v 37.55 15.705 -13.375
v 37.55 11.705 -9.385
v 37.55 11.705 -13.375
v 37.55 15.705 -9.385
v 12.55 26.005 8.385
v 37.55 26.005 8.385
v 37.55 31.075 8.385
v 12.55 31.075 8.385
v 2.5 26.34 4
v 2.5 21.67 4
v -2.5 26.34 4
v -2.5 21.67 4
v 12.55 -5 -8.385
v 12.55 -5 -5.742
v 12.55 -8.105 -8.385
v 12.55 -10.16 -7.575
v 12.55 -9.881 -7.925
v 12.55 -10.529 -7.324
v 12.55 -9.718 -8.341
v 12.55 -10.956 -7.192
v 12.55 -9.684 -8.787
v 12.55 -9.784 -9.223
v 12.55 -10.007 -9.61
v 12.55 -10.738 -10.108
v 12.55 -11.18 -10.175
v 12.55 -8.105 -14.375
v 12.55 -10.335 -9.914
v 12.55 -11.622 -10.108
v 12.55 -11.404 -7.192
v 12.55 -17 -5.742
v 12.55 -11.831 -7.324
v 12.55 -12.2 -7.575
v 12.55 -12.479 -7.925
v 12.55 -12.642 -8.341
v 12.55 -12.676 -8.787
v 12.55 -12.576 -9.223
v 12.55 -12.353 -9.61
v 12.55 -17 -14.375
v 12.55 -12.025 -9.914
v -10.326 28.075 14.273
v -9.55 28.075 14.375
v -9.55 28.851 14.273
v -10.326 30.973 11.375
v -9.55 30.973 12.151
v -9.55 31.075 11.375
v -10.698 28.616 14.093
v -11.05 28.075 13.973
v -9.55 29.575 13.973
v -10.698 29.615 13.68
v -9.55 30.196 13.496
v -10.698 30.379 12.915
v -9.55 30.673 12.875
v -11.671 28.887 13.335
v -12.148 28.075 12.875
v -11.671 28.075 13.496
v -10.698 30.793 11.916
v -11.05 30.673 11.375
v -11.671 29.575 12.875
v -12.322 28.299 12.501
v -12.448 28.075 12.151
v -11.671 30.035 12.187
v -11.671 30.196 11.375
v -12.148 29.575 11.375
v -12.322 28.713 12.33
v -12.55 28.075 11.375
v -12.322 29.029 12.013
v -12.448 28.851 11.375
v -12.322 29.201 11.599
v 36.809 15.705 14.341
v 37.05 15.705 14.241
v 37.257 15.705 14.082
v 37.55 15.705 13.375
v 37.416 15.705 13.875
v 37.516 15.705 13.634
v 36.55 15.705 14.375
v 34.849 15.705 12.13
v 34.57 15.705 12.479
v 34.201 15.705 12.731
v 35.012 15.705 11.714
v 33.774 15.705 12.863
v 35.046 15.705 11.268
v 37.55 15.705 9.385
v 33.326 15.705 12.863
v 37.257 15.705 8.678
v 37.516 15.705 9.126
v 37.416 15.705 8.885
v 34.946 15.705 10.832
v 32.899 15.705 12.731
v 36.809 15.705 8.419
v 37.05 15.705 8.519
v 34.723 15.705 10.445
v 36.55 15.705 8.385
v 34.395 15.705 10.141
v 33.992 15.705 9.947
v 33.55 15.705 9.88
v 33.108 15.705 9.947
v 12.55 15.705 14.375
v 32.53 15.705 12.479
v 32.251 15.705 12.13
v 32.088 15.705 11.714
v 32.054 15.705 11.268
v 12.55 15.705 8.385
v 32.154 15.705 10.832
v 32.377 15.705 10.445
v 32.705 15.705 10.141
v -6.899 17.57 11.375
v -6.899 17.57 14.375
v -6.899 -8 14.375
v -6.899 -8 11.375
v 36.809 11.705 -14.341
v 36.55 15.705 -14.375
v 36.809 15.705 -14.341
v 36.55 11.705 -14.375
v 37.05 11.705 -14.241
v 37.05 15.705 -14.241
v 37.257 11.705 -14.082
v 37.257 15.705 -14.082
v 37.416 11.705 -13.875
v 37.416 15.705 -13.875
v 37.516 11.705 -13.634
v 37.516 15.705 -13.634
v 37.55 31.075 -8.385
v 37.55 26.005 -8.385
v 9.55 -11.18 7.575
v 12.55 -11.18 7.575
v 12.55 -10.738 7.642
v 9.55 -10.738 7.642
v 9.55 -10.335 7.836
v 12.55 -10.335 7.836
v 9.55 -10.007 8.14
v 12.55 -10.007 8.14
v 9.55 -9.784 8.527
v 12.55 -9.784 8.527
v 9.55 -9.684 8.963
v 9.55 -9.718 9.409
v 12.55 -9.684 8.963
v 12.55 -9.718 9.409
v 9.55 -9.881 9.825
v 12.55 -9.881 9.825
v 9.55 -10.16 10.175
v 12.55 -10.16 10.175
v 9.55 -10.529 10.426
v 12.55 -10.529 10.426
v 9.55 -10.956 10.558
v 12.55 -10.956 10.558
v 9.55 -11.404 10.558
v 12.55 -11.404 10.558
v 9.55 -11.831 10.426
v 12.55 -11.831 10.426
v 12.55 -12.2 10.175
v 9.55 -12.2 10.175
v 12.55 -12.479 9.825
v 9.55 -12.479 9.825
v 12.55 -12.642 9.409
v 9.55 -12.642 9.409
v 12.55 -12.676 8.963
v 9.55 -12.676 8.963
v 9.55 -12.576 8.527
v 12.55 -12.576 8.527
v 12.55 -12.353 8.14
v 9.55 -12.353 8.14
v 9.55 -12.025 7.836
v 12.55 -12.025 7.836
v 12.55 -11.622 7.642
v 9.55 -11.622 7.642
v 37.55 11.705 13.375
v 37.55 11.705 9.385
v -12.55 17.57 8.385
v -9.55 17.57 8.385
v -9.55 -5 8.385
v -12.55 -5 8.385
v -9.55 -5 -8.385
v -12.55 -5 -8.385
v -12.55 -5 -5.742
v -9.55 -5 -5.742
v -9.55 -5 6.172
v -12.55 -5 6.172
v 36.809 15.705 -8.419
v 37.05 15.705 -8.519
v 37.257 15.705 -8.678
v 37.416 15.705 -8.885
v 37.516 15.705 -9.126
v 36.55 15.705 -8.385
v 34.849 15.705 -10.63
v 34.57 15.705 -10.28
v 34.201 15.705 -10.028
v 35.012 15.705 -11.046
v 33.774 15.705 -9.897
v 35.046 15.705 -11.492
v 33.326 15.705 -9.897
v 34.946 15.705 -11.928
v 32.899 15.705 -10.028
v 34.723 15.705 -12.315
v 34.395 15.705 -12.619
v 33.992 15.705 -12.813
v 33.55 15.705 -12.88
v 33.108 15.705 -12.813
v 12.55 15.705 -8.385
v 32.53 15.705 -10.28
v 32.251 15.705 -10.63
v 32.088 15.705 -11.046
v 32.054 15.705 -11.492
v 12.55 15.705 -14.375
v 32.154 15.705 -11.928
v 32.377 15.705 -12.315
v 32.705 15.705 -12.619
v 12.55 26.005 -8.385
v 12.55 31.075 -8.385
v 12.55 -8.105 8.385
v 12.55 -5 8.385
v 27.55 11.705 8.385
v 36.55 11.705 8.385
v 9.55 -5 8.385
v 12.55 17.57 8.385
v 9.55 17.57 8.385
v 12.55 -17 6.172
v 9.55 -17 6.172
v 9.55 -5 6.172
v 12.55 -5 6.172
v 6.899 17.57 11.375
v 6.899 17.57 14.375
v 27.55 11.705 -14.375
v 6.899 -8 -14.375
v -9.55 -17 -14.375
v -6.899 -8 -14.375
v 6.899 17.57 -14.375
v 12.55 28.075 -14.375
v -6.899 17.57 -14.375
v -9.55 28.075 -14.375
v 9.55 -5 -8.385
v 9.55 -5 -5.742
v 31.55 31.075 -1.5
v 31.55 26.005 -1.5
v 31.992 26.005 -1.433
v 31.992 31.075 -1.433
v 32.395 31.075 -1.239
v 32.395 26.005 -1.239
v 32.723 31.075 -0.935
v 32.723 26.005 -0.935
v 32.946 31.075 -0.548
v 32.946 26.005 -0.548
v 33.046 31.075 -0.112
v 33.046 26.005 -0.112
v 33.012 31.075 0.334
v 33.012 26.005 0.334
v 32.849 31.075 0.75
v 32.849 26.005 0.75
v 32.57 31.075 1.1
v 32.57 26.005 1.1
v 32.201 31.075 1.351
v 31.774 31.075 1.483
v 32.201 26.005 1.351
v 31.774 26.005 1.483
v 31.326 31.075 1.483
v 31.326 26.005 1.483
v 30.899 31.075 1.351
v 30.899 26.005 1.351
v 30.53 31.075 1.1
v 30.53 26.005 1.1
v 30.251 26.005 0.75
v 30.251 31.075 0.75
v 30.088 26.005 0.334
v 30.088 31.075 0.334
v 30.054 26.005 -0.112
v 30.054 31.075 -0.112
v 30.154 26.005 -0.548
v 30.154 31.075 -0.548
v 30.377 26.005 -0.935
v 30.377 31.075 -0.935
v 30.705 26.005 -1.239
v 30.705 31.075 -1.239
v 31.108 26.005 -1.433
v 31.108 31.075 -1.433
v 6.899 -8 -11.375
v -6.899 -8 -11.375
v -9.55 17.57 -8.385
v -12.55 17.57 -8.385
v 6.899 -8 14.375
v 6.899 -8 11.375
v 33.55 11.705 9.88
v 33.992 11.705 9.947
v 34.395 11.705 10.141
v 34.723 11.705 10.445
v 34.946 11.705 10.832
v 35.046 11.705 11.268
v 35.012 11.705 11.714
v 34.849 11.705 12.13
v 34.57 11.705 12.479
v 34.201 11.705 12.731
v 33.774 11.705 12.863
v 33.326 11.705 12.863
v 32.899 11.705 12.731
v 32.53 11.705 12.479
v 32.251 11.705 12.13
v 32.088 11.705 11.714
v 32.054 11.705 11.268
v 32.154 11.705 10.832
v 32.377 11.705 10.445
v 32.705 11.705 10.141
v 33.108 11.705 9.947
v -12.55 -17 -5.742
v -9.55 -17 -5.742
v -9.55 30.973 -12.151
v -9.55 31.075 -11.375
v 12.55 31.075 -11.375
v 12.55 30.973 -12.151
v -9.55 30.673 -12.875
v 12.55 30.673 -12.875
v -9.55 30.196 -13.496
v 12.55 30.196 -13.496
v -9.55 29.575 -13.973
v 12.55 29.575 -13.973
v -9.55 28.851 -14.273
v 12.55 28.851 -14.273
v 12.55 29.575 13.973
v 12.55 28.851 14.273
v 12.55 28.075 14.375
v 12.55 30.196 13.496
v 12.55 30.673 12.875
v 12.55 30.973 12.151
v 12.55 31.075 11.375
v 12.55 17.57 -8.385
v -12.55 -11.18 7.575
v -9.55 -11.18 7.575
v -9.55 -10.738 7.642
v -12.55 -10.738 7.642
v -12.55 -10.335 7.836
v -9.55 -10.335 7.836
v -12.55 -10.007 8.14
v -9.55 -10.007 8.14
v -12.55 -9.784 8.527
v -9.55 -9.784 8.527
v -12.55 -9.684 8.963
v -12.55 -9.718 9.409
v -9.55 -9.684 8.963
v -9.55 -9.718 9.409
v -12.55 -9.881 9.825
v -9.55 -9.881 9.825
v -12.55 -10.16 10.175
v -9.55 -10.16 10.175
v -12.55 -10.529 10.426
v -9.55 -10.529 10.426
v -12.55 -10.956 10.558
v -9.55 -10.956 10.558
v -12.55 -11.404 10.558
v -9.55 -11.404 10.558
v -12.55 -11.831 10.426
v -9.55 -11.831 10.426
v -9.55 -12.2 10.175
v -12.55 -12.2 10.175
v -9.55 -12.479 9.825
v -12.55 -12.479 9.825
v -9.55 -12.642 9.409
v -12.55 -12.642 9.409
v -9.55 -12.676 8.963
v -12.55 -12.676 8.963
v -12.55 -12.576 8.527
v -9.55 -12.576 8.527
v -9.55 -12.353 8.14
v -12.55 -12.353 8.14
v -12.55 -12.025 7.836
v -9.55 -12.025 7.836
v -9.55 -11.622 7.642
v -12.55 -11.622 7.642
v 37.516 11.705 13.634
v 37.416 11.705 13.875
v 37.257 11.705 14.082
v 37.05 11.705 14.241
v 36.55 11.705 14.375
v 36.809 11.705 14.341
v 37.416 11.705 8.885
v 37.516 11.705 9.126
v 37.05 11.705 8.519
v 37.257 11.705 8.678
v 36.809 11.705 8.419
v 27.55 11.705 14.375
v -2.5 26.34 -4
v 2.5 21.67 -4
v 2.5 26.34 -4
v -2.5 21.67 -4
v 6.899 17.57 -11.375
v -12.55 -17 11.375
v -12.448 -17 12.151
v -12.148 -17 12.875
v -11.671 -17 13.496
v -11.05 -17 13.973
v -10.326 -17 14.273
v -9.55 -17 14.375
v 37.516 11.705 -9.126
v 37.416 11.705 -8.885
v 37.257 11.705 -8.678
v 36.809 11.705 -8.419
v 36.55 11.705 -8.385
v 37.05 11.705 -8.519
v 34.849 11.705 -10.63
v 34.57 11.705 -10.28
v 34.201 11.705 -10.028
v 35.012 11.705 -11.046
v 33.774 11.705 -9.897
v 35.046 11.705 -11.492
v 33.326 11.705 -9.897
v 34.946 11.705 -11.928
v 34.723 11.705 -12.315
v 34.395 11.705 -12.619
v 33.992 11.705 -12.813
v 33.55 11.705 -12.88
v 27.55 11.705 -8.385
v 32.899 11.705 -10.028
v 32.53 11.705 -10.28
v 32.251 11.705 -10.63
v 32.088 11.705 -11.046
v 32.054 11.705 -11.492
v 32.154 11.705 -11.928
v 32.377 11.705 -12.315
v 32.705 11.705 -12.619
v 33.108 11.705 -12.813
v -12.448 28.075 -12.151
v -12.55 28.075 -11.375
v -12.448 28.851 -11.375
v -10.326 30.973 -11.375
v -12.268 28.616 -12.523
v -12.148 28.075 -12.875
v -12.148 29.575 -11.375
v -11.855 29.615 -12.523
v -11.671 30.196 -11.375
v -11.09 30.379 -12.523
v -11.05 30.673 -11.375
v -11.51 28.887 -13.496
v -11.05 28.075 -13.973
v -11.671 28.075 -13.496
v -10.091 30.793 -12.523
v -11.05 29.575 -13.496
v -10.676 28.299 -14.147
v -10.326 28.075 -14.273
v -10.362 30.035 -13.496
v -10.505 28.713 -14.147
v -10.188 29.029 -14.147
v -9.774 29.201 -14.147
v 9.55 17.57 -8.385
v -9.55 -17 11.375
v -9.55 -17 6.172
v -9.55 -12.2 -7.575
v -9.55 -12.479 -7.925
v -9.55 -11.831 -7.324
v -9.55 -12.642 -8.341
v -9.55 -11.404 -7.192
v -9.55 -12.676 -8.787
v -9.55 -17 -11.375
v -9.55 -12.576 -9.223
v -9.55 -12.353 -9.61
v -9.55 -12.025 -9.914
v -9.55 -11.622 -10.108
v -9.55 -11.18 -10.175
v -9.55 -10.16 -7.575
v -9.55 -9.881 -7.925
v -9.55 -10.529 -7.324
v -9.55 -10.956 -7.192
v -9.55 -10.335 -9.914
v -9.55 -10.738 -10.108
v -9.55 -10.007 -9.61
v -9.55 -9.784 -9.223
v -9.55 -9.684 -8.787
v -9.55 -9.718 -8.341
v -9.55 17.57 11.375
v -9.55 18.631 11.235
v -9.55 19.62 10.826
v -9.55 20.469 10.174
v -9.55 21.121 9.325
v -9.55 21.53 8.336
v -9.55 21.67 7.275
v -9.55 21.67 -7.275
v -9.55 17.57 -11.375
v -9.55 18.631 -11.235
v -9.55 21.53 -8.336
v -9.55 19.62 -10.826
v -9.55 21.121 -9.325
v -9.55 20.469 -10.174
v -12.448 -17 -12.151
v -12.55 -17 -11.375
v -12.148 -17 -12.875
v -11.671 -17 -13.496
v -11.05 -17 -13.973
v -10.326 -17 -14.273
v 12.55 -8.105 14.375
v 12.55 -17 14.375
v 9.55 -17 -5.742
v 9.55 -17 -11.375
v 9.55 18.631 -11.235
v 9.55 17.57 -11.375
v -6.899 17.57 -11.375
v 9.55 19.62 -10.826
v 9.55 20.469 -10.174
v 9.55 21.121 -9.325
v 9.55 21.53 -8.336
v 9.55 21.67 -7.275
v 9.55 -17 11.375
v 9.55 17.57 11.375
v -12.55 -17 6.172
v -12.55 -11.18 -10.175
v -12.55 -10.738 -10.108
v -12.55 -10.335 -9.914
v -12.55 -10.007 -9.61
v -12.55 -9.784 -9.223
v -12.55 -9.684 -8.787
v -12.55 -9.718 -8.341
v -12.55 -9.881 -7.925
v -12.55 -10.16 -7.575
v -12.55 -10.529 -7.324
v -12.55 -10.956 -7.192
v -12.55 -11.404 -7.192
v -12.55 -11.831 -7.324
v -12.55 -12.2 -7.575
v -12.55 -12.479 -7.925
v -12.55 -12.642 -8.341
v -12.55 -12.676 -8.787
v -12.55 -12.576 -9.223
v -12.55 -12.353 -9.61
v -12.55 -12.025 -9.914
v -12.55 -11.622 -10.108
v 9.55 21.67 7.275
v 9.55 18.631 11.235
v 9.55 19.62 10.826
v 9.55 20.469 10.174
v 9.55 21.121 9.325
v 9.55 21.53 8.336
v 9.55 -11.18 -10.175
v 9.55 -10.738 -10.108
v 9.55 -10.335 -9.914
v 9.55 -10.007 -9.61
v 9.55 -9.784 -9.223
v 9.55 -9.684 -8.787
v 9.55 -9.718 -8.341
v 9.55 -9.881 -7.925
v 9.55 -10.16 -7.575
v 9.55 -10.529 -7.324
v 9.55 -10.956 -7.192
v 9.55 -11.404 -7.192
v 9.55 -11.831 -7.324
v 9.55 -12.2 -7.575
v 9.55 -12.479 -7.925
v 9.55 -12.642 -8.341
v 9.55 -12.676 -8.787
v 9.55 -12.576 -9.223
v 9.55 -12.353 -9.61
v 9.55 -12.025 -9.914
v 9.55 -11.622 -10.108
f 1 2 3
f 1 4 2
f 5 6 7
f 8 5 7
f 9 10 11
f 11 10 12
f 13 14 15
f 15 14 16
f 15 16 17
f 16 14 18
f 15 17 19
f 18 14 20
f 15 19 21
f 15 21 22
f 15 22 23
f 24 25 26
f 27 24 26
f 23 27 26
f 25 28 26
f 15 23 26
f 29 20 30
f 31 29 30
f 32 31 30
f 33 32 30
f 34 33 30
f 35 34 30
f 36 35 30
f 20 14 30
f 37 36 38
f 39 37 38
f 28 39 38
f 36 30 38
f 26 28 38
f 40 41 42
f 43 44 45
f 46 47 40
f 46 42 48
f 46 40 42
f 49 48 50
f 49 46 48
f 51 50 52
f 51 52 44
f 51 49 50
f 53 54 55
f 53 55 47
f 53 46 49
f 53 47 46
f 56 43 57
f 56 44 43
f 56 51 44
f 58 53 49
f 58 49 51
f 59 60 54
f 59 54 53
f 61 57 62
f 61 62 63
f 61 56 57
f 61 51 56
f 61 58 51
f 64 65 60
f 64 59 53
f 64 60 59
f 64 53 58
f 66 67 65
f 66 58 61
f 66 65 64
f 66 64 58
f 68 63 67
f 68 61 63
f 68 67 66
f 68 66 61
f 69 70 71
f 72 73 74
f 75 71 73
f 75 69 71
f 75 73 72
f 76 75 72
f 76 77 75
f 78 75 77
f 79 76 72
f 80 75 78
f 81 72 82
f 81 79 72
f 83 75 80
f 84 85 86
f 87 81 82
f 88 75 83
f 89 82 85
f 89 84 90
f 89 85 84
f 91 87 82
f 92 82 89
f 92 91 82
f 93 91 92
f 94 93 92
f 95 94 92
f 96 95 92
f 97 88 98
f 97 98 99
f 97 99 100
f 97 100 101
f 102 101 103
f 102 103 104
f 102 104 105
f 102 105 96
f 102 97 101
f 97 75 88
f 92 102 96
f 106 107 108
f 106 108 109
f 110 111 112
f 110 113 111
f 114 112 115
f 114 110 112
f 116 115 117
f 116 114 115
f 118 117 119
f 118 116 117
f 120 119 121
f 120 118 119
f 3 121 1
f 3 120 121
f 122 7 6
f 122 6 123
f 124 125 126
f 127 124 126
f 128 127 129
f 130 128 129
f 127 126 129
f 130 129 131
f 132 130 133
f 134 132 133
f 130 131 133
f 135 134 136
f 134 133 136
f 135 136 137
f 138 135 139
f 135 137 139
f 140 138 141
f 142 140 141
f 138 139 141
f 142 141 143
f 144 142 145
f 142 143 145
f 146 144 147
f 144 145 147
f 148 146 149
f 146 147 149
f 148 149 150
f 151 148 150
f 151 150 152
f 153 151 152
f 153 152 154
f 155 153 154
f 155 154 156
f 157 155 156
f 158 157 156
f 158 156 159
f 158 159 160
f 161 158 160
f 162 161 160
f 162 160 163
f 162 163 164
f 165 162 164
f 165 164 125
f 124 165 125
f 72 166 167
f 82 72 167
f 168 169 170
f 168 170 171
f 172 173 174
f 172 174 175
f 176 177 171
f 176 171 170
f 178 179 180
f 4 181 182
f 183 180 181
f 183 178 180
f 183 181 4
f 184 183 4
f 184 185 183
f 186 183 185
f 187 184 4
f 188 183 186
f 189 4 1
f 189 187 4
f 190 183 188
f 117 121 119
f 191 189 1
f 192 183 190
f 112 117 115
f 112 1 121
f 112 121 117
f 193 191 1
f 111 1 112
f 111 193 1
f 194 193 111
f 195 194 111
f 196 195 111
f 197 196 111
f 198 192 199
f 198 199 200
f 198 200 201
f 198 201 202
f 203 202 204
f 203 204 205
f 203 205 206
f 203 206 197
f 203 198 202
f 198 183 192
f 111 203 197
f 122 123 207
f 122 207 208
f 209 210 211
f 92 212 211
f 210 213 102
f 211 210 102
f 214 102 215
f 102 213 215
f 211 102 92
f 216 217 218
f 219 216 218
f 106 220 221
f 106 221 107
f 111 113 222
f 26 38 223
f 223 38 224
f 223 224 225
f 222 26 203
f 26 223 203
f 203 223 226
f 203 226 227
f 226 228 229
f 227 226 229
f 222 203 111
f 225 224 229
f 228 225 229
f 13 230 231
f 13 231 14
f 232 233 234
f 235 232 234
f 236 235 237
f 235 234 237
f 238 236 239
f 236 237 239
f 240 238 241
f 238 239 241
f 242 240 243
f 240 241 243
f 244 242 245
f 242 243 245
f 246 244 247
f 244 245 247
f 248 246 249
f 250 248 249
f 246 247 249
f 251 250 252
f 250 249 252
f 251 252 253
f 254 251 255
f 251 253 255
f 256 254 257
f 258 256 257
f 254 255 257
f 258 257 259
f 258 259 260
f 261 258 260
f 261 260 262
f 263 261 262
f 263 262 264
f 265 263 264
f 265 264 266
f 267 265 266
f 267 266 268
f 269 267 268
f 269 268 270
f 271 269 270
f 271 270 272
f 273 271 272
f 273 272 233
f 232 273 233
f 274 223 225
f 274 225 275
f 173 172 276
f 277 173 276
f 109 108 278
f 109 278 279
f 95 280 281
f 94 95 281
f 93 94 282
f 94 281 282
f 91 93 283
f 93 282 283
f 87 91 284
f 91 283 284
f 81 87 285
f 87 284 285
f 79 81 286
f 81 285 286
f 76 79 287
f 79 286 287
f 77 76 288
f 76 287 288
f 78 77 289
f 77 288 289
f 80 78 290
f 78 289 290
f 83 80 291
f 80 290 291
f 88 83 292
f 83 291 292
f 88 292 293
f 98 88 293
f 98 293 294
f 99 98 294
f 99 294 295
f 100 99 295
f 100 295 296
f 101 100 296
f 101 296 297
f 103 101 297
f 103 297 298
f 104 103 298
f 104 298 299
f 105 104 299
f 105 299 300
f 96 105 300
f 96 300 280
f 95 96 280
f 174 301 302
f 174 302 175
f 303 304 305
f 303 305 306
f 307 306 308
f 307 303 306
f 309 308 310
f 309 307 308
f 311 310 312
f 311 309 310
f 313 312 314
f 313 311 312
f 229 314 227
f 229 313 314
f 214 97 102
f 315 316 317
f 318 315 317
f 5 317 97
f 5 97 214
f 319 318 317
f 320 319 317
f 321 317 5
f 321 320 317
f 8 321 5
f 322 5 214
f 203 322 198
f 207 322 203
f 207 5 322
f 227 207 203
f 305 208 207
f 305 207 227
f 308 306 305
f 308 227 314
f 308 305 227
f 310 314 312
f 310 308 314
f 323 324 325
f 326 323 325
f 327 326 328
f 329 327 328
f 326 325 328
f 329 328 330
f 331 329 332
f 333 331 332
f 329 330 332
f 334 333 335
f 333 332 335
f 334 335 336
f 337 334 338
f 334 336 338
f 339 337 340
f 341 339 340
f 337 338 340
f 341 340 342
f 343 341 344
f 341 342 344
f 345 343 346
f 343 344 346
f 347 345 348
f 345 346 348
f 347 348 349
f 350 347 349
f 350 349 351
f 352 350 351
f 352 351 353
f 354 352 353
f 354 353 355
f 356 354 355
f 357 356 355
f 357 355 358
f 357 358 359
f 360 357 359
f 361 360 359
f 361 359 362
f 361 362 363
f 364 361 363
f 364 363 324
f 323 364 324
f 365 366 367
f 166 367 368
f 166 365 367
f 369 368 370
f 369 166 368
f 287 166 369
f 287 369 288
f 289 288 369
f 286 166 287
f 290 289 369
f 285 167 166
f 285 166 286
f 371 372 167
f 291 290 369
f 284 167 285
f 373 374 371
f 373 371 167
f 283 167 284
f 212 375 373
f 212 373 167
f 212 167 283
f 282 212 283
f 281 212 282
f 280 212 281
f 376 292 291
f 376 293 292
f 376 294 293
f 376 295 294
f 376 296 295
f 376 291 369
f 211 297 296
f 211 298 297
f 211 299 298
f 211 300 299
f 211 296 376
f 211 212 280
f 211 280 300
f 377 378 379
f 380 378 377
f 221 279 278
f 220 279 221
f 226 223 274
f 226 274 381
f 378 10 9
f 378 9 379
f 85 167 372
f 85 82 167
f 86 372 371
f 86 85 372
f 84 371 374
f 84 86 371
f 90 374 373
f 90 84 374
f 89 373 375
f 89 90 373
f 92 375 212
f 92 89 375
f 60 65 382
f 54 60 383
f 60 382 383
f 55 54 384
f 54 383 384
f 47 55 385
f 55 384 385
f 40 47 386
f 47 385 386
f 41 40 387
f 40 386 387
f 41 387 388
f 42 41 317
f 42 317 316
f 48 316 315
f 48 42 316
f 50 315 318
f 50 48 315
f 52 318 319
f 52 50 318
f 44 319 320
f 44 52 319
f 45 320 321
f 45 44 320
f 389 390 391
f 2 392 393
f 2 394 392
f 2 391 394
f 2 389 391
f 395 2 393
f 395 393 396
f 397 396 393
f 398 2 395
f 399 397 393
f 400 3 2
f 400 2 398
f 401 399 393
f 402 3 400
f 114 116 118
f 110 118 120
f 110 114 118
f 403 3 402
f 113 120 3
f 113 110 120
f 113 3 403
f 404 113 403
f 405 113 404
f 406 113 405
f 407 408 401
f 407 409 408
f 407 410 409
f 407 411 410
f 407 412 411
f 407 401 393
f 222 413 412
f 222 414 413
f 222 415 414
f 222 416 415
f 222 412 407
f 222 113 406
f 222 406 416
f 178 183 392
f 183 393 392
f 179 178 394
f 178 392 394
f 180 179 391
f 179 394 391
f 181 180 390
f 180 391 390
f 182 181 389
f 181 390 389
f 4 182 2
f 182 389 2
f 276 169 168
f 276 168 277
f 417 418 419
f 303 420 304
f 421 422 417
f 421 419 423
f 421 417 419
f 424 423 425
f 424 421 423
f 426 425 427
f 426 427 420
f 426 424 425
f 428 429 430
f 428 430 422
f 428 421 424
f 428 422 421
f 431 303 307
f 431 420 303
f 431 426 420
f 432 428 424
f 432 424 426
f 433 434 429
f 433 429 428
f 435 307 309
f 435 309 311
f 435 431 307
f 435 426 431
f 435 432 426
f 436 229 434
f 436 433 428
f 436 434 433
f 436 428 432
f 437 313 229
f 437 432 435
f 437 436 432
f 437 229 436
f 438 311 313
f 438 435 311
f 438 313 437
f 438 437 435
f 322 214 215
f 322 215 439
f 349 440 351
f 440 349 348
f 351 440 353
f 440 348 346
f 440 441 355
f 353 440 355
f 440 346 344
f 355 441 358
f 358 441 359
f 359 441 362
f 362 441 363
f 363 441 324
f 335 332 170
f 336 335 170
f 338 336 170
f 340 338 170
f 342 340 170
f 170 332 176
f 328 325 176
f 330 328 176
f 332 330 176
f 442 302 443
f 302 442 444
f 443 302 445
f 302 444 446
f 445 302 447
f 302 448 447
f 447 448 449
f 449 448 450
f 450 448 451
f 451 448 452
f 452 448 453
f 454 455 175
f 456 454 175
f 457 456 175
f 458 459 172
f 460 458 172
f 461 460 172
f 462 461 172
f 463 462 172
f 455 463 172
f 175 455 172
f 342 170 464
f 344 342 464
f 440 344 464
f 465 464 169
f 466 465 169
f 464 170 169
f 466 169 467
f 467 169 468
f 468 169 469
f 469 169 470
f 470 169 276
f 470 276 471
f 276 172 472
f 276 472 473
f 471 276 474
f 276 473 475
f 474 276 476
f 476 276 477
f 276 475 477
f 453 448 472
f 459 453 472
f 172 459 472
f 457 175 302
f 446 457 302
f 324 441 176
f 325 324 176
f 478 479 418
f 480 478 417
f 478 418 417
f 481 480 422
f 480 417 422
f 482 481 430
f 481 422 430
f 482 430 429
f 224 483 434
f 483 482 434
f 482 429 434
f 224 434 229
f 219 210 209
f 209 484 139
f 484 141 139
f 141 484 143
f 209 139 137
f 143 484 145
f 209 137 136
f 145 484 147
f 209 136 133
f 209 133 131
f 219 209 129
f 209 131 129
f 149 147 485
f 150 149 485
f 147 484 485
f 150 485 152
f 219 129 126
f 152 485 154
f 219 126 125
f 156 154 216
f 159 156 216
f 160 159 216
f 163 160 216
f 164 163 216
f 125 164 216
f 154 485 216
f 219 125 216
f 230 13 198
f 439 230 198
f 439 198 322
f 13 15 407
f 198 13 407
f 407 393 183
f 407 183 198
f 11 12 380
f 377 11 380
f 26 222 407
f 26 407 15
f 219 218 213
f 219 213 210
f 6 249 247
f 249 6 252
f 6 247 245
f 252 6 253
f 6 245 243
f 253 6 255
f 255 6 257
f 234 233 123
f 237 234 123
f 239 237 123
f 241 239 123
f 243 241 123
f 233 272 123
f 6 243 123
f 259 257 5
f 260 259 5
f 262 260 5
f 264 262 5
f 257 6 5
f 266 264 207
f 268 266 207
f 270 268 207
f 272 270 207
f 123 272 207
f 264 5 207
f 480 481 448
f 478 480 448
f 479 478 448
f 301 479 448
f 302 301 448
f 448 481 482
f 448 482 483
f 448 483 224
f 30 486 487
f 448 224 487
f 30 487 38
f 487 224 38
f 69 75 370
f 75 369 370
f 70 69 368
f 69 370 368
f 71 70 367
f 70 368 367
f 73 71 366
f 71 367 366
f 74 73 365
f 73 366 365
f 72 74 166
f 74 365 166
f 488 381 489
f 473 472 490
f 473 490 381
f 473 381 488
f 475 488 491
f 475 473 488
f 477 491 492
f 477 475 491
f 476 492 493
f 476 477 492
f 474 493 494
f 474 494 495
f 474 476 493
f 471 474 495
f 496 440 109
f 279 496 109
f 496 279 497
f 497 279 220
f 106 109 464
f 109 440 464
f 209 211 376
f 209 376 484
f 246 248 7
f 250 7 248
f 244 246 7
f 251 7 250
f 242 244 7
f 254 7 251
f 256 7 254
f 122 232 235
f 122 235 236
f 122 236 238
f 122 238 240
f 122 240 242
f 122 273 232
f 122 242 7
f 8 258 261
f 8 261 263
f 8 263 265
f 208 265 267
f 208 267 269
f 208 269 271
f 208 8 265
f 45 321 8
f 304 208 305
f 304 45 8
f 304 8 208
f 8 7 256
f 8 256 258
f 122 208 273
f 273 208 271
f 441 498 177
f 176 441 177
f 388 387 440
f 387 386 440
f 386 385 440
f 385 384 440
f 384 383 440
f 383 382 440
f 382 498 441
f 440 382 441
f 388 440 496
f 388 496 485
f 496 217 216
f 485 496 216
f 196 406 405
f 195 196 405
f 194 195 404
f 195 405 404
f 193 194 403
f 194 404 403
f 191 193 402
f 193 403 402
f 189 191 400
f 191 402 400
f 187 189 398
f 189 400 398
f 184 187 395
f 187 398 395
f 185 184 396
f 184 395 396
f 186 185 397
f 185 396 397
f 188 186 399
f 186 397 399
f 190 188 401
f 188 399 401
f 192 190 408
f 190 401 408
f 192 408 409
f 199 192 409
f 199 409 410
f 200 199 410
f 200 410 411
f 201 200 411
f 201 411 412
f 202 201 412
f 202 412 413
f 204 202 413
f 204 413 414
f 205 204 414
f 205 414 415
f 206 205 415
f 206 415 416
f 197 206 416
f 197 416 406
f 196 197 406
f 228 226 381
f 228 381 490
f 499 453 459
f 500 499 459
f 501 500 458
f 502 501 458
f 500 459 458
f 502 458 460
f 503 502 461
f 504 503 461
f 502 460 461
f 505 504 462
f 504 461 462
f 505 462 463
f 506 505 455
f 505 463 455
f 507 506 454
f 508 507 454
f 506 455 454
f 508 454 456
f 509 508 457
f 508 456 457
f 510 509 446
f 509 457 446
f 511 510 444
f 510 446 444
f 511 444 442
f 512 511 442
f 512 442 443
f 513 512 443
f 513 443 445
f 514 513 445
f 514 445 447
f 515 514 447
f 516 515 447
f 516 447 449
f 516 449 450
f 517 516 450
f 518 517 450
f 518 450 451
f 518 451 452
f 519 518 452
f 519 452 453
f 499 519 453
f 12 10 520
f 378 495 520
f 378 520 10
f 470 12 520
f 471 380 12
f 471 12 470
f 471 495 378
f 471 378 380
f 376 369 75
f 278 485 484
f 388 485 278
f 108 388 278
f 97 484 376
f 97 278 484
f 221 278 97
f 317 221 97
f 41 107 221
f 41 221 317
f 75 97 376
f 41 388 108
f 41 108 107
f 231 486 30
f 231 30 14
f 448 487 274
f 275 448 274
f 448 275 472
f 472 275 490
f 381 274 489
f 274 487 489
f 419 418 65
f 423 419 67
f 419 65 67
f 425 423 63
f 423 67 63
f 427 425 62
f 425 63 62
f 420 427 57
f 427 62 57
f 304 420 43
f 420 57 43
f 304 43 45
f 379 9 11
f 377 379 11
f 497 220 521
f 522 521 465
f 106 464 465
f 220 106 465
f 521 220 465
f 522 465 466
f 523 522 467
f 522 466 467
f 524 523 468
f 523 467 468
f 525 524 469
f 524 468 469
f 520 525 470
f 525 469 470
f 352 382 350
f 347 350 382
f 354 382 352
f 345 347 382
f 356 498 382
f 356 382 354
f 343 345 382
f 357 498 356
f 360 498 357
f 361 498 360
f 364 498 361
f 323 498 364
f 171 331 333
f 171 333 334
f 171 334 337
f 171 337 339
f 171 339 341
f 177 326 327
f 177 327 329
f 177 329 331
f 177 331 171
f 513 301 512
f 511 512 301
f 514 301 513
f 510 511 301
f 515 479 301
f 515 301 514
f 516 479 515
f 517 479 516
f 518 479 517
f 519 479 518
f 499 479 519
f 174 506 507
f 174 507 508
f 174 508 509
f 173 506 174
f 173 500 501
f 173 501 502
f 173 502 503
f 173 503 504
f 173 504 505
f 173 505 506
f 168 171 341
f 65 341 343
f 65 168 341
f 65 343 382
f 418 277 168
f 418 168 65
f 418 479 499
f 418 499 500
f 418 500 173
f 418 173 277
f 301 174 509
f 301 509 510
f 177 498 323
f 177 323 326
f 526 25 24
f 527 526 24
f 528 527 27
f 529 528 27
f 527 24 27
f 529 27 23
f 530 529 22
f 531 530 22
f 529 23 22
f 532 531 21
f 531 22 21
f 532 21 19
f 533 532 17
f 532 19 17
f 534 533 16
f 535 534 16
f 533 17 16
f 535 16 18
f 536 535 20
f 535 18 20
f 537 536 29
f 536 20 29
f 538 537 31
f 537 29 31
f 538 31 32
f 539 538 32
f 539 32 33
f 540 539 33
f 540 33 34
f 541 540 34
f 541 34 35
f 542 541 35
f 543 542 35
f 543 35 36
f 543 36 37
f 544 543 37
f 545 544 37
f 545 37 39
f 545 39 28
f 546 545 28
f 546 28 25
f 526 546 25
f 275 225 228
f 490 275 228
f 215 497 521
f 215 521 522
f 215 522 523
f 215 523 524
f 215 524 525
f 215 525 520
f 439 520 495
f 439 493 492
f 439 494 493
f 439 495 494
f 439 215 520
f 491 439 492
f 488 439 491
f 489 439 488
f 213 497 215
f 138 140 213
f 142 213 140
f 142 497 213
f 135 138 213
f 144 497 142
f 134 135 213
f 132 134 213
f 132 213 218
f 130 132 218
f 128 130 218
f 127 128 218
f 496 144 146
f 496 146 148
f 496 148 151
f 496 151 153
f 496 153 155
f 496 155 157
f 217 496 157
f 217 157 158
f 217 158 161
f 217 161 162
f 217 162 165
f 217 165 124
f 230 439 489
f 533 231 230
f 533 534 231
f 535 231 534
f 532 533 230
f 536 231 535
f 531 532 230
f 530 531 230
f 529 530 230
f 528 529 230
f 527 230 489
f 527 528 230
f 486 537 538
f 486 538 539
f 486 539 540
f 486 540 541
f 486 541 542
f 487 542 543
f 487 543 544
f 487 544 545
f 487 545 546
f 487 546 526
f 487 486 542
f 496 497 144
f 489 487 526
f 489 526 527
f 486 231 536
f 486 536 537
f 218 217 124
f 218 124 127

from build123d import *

# Parameters (mm, degrees)
SKETCH4_W            = 25.1
SKETCH4_H            = 28.75
BOSS_EXTRUDE2_DEPTH  = 53
SKETCH5_W            = 19.1
SKETCH5_H            = 22.75
CUT_EXTRUDE1_DEPTH   = 21.67
FILLET1_R            = 4.1
SKETCH6_W            = 5
SKETCH6_H            = 8
CUT_EXTRUDE2_DEPTH   = 4.67
SKETCH7_W            = 16.769550268
SKETCH7_H            = 35.14
CUT_EXTRUDE3_DEPTH   = 40
SKETCH8_W            = 13.798322684
SKETCH8_H            = 35.14
CUT_EXTRUDE4_DEPTH   = 40
BOSS_EXTRUDE3_DEPTH  = 17
SKETCH10_W           = 3
SKETCH10_H           = 9
BOSS_EXTRUDE4_DEPTH  = 13.8
SKETCH11_W           = 3
SKETCH11_H           = 9
BOSS_EXTRUDE5_DEPTH  = 13.8
SKETCH12_W           = 3
SKETCH12_H           = 12
BOSS_EXTRUDE6_DEPTH  = 16.77
SKETCH24_R           = 1.5
CUT_EXTRUDE6_DEPTH   = 40.8
SKETCH25_W           = 28.75
SKETCH25_H           = 21.925089144
CUT_EXTRUDE7_DEPTH   = 40.8
SKETCH26_W           = 11.913987102
SKETCH26_H           = 12
CUT_EXTRUDE8_DEPTH   = 40.8
SKETCH30_W           = 28.75
SKETCH30_H           = 5.07
BOSS_EXTRUDE10_DEPTH = 30
SKETCH32_W           = 5.990224866
SKETCH32_H           = 23.810252184
BOSS_EXTRUDE13_DEPTH = 30
CUT_EXTRUDE9_DEPTH   = 30
SKETCH36_W           = 5
SKETCH36_H           = 28.75
CUT_EXTRUDE10_DEPTH  = 30
SKETCH38_W           = 5.99
SKETCH38_H           = 5.07
CUT_EXTRUDE11_DEPTH  = 25
SKETCH39_R           = 1.5
CUT_EXTRUDE12_DEPTH  = 25
SKETCH40_R           = 1.5
CUT_EXTRUDE13_DEPTH  = 25
FILLET4_R            = 3
FILLET5_R            = 3
FILLET7_R            = 1


with BuildPart() as part:
    # Sketch4 → Boss-Extrude2 (new body)
    with BuildSketch(Plane(origin=(0, 0, 0), x_dir=(1, 0, 0), z_dir=(0, 1, 0))):
        Rectangle(SKETCH4_W, SKETCH4_H)
    extrude(amount=BOSS_EXTRUDE2_DEPTH)

    # Sketch5 → Cut-Extrude1 (cut)
    with BuildSketch(Plane(origin=(0, 0, 0), x_dir=(-1, 0, 0), z_dir=(0, -1, 0))):
        Rectangle(SKETCH5_W, SKETCH5_H)
    extrude(amount=-CUT_EXTRUDE1_DEPTH, mode=Mode.SUBTRACT)

    # Fillet1
    fillet1_edges = [part.edges().sort_by_distance(p)[0] for p in [
        (0, 21.67, -11.375),
        (0, 21.67, 11.375),
    ]]
    fillet(fillet1_edges, radius=FILLET1_R)

    # Sketch6 → Cut-Extrude2 (cut)
    with BuildSketch(Plane(origin=(0, 21.67, 0), x_dir=(-1, 0, 0), z_dir=(0, -1, 0))):
        Rectangle(SKETCH6_W, SKETCH6_H)
    extrude(amount=-CUT_EXTRUDE2_DEPTH, mode=Mode.SUBTRACT)

    # Sketch7 → Cut-Extrude3 (cut)
    with BuildSketch(Plane(origin=(12.55, 0, 0), x_dir=(0, 0, -1), z_dir=(1, 0, 0))):
        Rectangle(SKETCH7_W, SKETCH7_H)
    extrude(amount=-CUT_EXTRUDE3_DEPTH, mode=Mode.SUBTRACT)

    # Sketch8 → Cut-Extrude4 (cut)
    with BuildSketch(Plane(origin=(0, 0, -14.375), x_dir=(-1, 0, 0), z_dir=(0, 0, -1))):
        Rectangle(SKETCH8_W, SKETCH8_H)
    extrude(amount=-CUT_EXTRUDE4_DEPTH, mode=Mode.SUBTRACT)

    # Sketch9 → Boss-Extrude3 (add)
    with BuildSketch(Plane.XZ):
        Polygon((-9.55, 8.384775134), (-12.55, 8.384775134), (-12.55, 14.375), (-6.899161342, 14.375), (-6.899161342, 11.375), (-9.55, 11.375), align=None)
        Polygon((-9.55, -8.384775134), (-12.55, -8.384775134), (-12.55, -14.375), (-6.899161342, -14.375), (-6.899161342, -11.375), (-9.55, -11.375), align=None)
        Polygon((6.899161342, -11.375), (6.899161342, -14.375), (12.55, -14.375), (12.55, -8.384775134), (9.55, -8.384775134), (9.55, -11.375), align=None)
        Polygon((9.55, 8.384775134), (12.55, 8.384775134), (12.55, 14.375), (6.899161342, 14.375), (6.899161342, 11.375), (9.55, 11.375), align=None)
    extrude(amount=BOSS_EXTRUDE3_DEPTH)

    # Sketch10 → Boss-Extrude4 (add)
    with BuildSketch(Plane(origin=(-6.899161342, 0, 0), x_dir=(0, 0, -1), z_dir=(1, 0, 0))):
        with Locations((-12.875, -12.5)):
            Rectangle(SKETCH10_W, SKETCH10_H)
    extrude(amount=BOSS_EXTRUDE4_DEPTH)

    # Sketch11 → Boss-Extrude5 (add)
    with BuildSketch(Plane.ZY.offset(-6.899161342)):
        with Locations((-12.875, -12.5)):
            Rectangle(SKETCH11_W, SKETCH11_H)
    extrude(amount=BOSS_EXTRUDE5_DEPTH)

    # Sketch12 → Boss-Extrude6 (add)
    with BuildSketch(Plane.XY.offset(-8.384775134)):
        with Locations((-11.05, -11)):
            Rectangle(SKETCH12_W, SKETCH12_H)
        with Locations((11.05, -11)):
            Rectangle(SKETCH12_W, SKETCH12_H)
    extrude(amount=BOSS_EXTRUDE6_DEPTH)

    # Sketch24 → Cut-Extrude6 (cut)
    with BuildSketch(Plane(origin=(12.55, 0, 0), x_dir=(0, 0, -1), z_dir=(1, 0, 0))):
        with Locations((8.675, -11.18)):
            Circle(SKETCH24_R)
        with Locations((-9.075, -11.18)):
            Circle(SKETCH24_R)
    extrude(amount=-CUT_EXTRUDE6_DEPTH, mode=Mode.SUBTRACT)

    # Sketch25 → Cut-Extrude7 (cut)
    with BuildSketch(Plane.ZY.offset(12.55)):
        with Locations((0, 42.037455428)):
            Rectangle(SKETCH25_W, SKETCH25_H)
    extrude(amount=-CUT_EXTRUDE7_DEPTH, mode=Mode.SUBTRACT)

    # Sketch26 → Cut-Extrude8 (cut)
    with BuildSketch(Plane.ZY.offset(12.55)):
        with Locations((0.21531302, -11)):
            Rectangle(SKETCH26_W, SKETCH26_H)
    extrude(amount=-CUT_EXTRUDE8_DEPTH, mode=Mode.SUBTRACT)

    # Sketch30 → Boss-Extrude10 (add)
    with BuildSketch(Plane(origin=(12.55, 0, 0), x_dir=(0, 0, -1), z_dir=(1, 0, 0))):
        with Locations((0, 28.539910856)):
            Rectangle(SKETCH30_W, SKETCH30_H)
    extrude(amount=BOSS_EXTRUDE10_DEPTH)

    # Sketch32 → Boss-Extrude13 (add)
    with BuildSketch(Plane(origin=(12.55, 0, 0), x_dir=(0, 0, -1), z_dir=(1, 0, 0))):
        with Locations((-11.379887567, 3.799784764)):
            Rectangle(SKETCH32_W, SKETCH32_H)
        with Locations((11.379887567, 3.799784764)):
            Rectangle(SKETCH32_W, SKETCH32_H)
    extrude(amount=BOSS_EXTRUDE13_DEPTH)

    # Sketch35 → Cut-Extrude9 (cut)
    with BuildSketch(Plane(origin=(0, 0, -14.375), x_dir=(-1, 0, 0), z_dir=(0, 0, -1))):
        Polygon((-42.55, 11.704910856), (-27.55, 11.704910856), (-12.55, -8.105341328), (-42.55, -8.105341328), align=None)
    extrude(amount=-CUT_EXTRUDE9_DEPTH, mode=Mode.SUBTRACT)

    # Sketch36 → Cut-Extrude10 (cut)
    with BuildSketch(Plane(origin=(0, 31.074910856, 0), x_dir=(1, 0, 0), z_dir=(0, 1, 0))):
        with Locations((40.05, 0)):
            Rectangle(SKETCH36_W, SKETCH36_H)
    extrude(amount=-CUT_EXTRUDE10_DEPTH, mode=Mode.SUBTRACT)

    # Sketch38 → Cut-Extrude11 (cut)
    with BuildSketch(Plane(origin=(37.55, 0, 0), x_dir=(0, 0, -1), z_dir=(1, 0, 0))):
        with Locations((-11.38, 28.539910856)):
            Rectangle(SKETCH38_W, SKETCH38_H)
        with Locations((11.38, 28.539910856)):
            Rectangle(SKETCH38_W, SKETCH38_H)
    extrude(amount=-CUT_EXTRUDE11_DEPTH, mode=Mode.SUBTRACT)

    # Sketch39 → Cut-Extrude12 (cut)
    with BuildSketch(Plane(origin=(0, 11.704910856, 0), x_dir=(-1, 0, 0), z_dir=(0, -1, 0))):
        with Locations(Location((-33.55, 11.379887567, 0), (0, 0, 90))):
            Circle(SKETCH39_R)
        with Locations(Location((-33.55, -11.379887567, 0), (0, 0, 90))):
            Circle(SKETCH39_R)
    extrude(amount=-CUT_EXTRUDE12_DEPTH, mode=Mode.SUBTRACT)

    # Sketch40 → Cut-Extrude13 (cut)
    with BuildSketch(Plane.XZ.offset(-26.004910856)):
        with Locations(Location((31.55, 0, 0), (0, 0, 270))):
            Circle(SKETCH40_R)
    extrude(amount=-CUT_EXTRUDE13_DEPTH, mode=Mode.SUBTRACT)

    # Fillet4
    fillet4_edges = [part.edges().sort_by_distance(p)[0] for p in [
        (-12.55, 31.074910856, 0),
        (0, 31.074910856, 14.375),
        (0, 31.074910856, -14.375),
    ]]
    fillet(fillet4_edges, radius=FILLET4_R)

    # Fillet5
    # the kernel refuses this fillet: 3 mm, written as the material it takes off along each edge
    with BuildSketch(Plane(origin=(-9.55, 28.074910856, 11.375), x_dir=(0, 0, 1), z_dir=(-1, 0, 0))) as fillet5_piece_1_section:
        Polygon((0, 0), (FILLET5_R, 0), (FILLET5_R, FILLET5_R), (0, FILLET5_R), align=None)
    fillet5_piece_1 = extrude(amount=FILLET5_R, mode=Mode.PRIVATE)
    fillet5_piece_1 = fillet5_piece_1 - Plane(origin=(-9.55, 28.074910856, 11.375), x_dir=(0, -0.7071067811865475, -0.7071067811865475), z_dir=(-1, 0, 0)) * Sphere(FILLET5_R, mode=Mode.PRIVATE)
    add(fillet5_piece_1, mode=Mode.SUBTRACT)
    with BuildSketch(Plane(origin=(-9.55, 28.074910856, -11.375), x_dir=(-1, 0, 0), z_dir=(0, 0, -1))) as fillet5_piece_2_section:
        Polygon((0, 0), (FILLET5_R, 0), (FILLET5_R, FILLET5_R), (0, FILLET5_R), align=None)
    fillet5_piece_2 = extrude(amount=FILLET5_R, mode=Mode.PRIVATE)
    fillet5_piece_2 = fillet5_piece_2 - Plane(origin=(-9.55, 28.074910856, -11.375), x_dir=(0.7071067811865475, -0.7071067811865475, 0), z_dir=(0, 0, -1)) * Sphere(FILLET5_R, mode=Mode.PRIVATE)
    add(fillet5_piece_2, mode=Mode.SUBTRACT)
    with BuildSketch(Plane(origin=(-12.55, 28.074910856, -14.375), x_dir=(1, 0, 0), z_dir=(0, -1, 0))) as fillet5_piece_3:
        with BuildLine():
            CenterArc((FILLET5_R, FILLET5_R), FILLET5_R, 180, 90)
            Line((0, FILLET5_R), (0, 0))
            Line((0, 0), (FILLET5_R, 0))
        make_face()
    extrude(amount=52.574910856, mode=Mode.SUBTRACT)
    with BuildSketch(Plane(origin=(-12.55, -24.5, 14.375), x_dir=(0, 0, -1), z_dir=(0, 1, 0))) as fillet5_piece_4:
        with BuildLine():
            CenterArc((FILLET5_R, -FILLET5_R), FILLET5_R, 90, 90)
            Line((0, -FILLET5_R), (0, 0))
            Line((0, 0), (FILLET5_R, 0))
        make_face()
    extrude(amount=52.574910856, mode=Mode.SUBTRACT)

    # Fillet7
    fillet7_edges = [part.edges().sort_by_distance(p)[0] for p in [
        (37.55, 13.704910856, -14.375),
        (37.55, 13.704910856, -8.384775134),
        (37.55, 13.704910856, 14.375),
        (37.55, 13.704910856, 8.384775134),
    ]]
    fillet(fillet7_edges, radius=FILLET7_R)


solid = part.part
